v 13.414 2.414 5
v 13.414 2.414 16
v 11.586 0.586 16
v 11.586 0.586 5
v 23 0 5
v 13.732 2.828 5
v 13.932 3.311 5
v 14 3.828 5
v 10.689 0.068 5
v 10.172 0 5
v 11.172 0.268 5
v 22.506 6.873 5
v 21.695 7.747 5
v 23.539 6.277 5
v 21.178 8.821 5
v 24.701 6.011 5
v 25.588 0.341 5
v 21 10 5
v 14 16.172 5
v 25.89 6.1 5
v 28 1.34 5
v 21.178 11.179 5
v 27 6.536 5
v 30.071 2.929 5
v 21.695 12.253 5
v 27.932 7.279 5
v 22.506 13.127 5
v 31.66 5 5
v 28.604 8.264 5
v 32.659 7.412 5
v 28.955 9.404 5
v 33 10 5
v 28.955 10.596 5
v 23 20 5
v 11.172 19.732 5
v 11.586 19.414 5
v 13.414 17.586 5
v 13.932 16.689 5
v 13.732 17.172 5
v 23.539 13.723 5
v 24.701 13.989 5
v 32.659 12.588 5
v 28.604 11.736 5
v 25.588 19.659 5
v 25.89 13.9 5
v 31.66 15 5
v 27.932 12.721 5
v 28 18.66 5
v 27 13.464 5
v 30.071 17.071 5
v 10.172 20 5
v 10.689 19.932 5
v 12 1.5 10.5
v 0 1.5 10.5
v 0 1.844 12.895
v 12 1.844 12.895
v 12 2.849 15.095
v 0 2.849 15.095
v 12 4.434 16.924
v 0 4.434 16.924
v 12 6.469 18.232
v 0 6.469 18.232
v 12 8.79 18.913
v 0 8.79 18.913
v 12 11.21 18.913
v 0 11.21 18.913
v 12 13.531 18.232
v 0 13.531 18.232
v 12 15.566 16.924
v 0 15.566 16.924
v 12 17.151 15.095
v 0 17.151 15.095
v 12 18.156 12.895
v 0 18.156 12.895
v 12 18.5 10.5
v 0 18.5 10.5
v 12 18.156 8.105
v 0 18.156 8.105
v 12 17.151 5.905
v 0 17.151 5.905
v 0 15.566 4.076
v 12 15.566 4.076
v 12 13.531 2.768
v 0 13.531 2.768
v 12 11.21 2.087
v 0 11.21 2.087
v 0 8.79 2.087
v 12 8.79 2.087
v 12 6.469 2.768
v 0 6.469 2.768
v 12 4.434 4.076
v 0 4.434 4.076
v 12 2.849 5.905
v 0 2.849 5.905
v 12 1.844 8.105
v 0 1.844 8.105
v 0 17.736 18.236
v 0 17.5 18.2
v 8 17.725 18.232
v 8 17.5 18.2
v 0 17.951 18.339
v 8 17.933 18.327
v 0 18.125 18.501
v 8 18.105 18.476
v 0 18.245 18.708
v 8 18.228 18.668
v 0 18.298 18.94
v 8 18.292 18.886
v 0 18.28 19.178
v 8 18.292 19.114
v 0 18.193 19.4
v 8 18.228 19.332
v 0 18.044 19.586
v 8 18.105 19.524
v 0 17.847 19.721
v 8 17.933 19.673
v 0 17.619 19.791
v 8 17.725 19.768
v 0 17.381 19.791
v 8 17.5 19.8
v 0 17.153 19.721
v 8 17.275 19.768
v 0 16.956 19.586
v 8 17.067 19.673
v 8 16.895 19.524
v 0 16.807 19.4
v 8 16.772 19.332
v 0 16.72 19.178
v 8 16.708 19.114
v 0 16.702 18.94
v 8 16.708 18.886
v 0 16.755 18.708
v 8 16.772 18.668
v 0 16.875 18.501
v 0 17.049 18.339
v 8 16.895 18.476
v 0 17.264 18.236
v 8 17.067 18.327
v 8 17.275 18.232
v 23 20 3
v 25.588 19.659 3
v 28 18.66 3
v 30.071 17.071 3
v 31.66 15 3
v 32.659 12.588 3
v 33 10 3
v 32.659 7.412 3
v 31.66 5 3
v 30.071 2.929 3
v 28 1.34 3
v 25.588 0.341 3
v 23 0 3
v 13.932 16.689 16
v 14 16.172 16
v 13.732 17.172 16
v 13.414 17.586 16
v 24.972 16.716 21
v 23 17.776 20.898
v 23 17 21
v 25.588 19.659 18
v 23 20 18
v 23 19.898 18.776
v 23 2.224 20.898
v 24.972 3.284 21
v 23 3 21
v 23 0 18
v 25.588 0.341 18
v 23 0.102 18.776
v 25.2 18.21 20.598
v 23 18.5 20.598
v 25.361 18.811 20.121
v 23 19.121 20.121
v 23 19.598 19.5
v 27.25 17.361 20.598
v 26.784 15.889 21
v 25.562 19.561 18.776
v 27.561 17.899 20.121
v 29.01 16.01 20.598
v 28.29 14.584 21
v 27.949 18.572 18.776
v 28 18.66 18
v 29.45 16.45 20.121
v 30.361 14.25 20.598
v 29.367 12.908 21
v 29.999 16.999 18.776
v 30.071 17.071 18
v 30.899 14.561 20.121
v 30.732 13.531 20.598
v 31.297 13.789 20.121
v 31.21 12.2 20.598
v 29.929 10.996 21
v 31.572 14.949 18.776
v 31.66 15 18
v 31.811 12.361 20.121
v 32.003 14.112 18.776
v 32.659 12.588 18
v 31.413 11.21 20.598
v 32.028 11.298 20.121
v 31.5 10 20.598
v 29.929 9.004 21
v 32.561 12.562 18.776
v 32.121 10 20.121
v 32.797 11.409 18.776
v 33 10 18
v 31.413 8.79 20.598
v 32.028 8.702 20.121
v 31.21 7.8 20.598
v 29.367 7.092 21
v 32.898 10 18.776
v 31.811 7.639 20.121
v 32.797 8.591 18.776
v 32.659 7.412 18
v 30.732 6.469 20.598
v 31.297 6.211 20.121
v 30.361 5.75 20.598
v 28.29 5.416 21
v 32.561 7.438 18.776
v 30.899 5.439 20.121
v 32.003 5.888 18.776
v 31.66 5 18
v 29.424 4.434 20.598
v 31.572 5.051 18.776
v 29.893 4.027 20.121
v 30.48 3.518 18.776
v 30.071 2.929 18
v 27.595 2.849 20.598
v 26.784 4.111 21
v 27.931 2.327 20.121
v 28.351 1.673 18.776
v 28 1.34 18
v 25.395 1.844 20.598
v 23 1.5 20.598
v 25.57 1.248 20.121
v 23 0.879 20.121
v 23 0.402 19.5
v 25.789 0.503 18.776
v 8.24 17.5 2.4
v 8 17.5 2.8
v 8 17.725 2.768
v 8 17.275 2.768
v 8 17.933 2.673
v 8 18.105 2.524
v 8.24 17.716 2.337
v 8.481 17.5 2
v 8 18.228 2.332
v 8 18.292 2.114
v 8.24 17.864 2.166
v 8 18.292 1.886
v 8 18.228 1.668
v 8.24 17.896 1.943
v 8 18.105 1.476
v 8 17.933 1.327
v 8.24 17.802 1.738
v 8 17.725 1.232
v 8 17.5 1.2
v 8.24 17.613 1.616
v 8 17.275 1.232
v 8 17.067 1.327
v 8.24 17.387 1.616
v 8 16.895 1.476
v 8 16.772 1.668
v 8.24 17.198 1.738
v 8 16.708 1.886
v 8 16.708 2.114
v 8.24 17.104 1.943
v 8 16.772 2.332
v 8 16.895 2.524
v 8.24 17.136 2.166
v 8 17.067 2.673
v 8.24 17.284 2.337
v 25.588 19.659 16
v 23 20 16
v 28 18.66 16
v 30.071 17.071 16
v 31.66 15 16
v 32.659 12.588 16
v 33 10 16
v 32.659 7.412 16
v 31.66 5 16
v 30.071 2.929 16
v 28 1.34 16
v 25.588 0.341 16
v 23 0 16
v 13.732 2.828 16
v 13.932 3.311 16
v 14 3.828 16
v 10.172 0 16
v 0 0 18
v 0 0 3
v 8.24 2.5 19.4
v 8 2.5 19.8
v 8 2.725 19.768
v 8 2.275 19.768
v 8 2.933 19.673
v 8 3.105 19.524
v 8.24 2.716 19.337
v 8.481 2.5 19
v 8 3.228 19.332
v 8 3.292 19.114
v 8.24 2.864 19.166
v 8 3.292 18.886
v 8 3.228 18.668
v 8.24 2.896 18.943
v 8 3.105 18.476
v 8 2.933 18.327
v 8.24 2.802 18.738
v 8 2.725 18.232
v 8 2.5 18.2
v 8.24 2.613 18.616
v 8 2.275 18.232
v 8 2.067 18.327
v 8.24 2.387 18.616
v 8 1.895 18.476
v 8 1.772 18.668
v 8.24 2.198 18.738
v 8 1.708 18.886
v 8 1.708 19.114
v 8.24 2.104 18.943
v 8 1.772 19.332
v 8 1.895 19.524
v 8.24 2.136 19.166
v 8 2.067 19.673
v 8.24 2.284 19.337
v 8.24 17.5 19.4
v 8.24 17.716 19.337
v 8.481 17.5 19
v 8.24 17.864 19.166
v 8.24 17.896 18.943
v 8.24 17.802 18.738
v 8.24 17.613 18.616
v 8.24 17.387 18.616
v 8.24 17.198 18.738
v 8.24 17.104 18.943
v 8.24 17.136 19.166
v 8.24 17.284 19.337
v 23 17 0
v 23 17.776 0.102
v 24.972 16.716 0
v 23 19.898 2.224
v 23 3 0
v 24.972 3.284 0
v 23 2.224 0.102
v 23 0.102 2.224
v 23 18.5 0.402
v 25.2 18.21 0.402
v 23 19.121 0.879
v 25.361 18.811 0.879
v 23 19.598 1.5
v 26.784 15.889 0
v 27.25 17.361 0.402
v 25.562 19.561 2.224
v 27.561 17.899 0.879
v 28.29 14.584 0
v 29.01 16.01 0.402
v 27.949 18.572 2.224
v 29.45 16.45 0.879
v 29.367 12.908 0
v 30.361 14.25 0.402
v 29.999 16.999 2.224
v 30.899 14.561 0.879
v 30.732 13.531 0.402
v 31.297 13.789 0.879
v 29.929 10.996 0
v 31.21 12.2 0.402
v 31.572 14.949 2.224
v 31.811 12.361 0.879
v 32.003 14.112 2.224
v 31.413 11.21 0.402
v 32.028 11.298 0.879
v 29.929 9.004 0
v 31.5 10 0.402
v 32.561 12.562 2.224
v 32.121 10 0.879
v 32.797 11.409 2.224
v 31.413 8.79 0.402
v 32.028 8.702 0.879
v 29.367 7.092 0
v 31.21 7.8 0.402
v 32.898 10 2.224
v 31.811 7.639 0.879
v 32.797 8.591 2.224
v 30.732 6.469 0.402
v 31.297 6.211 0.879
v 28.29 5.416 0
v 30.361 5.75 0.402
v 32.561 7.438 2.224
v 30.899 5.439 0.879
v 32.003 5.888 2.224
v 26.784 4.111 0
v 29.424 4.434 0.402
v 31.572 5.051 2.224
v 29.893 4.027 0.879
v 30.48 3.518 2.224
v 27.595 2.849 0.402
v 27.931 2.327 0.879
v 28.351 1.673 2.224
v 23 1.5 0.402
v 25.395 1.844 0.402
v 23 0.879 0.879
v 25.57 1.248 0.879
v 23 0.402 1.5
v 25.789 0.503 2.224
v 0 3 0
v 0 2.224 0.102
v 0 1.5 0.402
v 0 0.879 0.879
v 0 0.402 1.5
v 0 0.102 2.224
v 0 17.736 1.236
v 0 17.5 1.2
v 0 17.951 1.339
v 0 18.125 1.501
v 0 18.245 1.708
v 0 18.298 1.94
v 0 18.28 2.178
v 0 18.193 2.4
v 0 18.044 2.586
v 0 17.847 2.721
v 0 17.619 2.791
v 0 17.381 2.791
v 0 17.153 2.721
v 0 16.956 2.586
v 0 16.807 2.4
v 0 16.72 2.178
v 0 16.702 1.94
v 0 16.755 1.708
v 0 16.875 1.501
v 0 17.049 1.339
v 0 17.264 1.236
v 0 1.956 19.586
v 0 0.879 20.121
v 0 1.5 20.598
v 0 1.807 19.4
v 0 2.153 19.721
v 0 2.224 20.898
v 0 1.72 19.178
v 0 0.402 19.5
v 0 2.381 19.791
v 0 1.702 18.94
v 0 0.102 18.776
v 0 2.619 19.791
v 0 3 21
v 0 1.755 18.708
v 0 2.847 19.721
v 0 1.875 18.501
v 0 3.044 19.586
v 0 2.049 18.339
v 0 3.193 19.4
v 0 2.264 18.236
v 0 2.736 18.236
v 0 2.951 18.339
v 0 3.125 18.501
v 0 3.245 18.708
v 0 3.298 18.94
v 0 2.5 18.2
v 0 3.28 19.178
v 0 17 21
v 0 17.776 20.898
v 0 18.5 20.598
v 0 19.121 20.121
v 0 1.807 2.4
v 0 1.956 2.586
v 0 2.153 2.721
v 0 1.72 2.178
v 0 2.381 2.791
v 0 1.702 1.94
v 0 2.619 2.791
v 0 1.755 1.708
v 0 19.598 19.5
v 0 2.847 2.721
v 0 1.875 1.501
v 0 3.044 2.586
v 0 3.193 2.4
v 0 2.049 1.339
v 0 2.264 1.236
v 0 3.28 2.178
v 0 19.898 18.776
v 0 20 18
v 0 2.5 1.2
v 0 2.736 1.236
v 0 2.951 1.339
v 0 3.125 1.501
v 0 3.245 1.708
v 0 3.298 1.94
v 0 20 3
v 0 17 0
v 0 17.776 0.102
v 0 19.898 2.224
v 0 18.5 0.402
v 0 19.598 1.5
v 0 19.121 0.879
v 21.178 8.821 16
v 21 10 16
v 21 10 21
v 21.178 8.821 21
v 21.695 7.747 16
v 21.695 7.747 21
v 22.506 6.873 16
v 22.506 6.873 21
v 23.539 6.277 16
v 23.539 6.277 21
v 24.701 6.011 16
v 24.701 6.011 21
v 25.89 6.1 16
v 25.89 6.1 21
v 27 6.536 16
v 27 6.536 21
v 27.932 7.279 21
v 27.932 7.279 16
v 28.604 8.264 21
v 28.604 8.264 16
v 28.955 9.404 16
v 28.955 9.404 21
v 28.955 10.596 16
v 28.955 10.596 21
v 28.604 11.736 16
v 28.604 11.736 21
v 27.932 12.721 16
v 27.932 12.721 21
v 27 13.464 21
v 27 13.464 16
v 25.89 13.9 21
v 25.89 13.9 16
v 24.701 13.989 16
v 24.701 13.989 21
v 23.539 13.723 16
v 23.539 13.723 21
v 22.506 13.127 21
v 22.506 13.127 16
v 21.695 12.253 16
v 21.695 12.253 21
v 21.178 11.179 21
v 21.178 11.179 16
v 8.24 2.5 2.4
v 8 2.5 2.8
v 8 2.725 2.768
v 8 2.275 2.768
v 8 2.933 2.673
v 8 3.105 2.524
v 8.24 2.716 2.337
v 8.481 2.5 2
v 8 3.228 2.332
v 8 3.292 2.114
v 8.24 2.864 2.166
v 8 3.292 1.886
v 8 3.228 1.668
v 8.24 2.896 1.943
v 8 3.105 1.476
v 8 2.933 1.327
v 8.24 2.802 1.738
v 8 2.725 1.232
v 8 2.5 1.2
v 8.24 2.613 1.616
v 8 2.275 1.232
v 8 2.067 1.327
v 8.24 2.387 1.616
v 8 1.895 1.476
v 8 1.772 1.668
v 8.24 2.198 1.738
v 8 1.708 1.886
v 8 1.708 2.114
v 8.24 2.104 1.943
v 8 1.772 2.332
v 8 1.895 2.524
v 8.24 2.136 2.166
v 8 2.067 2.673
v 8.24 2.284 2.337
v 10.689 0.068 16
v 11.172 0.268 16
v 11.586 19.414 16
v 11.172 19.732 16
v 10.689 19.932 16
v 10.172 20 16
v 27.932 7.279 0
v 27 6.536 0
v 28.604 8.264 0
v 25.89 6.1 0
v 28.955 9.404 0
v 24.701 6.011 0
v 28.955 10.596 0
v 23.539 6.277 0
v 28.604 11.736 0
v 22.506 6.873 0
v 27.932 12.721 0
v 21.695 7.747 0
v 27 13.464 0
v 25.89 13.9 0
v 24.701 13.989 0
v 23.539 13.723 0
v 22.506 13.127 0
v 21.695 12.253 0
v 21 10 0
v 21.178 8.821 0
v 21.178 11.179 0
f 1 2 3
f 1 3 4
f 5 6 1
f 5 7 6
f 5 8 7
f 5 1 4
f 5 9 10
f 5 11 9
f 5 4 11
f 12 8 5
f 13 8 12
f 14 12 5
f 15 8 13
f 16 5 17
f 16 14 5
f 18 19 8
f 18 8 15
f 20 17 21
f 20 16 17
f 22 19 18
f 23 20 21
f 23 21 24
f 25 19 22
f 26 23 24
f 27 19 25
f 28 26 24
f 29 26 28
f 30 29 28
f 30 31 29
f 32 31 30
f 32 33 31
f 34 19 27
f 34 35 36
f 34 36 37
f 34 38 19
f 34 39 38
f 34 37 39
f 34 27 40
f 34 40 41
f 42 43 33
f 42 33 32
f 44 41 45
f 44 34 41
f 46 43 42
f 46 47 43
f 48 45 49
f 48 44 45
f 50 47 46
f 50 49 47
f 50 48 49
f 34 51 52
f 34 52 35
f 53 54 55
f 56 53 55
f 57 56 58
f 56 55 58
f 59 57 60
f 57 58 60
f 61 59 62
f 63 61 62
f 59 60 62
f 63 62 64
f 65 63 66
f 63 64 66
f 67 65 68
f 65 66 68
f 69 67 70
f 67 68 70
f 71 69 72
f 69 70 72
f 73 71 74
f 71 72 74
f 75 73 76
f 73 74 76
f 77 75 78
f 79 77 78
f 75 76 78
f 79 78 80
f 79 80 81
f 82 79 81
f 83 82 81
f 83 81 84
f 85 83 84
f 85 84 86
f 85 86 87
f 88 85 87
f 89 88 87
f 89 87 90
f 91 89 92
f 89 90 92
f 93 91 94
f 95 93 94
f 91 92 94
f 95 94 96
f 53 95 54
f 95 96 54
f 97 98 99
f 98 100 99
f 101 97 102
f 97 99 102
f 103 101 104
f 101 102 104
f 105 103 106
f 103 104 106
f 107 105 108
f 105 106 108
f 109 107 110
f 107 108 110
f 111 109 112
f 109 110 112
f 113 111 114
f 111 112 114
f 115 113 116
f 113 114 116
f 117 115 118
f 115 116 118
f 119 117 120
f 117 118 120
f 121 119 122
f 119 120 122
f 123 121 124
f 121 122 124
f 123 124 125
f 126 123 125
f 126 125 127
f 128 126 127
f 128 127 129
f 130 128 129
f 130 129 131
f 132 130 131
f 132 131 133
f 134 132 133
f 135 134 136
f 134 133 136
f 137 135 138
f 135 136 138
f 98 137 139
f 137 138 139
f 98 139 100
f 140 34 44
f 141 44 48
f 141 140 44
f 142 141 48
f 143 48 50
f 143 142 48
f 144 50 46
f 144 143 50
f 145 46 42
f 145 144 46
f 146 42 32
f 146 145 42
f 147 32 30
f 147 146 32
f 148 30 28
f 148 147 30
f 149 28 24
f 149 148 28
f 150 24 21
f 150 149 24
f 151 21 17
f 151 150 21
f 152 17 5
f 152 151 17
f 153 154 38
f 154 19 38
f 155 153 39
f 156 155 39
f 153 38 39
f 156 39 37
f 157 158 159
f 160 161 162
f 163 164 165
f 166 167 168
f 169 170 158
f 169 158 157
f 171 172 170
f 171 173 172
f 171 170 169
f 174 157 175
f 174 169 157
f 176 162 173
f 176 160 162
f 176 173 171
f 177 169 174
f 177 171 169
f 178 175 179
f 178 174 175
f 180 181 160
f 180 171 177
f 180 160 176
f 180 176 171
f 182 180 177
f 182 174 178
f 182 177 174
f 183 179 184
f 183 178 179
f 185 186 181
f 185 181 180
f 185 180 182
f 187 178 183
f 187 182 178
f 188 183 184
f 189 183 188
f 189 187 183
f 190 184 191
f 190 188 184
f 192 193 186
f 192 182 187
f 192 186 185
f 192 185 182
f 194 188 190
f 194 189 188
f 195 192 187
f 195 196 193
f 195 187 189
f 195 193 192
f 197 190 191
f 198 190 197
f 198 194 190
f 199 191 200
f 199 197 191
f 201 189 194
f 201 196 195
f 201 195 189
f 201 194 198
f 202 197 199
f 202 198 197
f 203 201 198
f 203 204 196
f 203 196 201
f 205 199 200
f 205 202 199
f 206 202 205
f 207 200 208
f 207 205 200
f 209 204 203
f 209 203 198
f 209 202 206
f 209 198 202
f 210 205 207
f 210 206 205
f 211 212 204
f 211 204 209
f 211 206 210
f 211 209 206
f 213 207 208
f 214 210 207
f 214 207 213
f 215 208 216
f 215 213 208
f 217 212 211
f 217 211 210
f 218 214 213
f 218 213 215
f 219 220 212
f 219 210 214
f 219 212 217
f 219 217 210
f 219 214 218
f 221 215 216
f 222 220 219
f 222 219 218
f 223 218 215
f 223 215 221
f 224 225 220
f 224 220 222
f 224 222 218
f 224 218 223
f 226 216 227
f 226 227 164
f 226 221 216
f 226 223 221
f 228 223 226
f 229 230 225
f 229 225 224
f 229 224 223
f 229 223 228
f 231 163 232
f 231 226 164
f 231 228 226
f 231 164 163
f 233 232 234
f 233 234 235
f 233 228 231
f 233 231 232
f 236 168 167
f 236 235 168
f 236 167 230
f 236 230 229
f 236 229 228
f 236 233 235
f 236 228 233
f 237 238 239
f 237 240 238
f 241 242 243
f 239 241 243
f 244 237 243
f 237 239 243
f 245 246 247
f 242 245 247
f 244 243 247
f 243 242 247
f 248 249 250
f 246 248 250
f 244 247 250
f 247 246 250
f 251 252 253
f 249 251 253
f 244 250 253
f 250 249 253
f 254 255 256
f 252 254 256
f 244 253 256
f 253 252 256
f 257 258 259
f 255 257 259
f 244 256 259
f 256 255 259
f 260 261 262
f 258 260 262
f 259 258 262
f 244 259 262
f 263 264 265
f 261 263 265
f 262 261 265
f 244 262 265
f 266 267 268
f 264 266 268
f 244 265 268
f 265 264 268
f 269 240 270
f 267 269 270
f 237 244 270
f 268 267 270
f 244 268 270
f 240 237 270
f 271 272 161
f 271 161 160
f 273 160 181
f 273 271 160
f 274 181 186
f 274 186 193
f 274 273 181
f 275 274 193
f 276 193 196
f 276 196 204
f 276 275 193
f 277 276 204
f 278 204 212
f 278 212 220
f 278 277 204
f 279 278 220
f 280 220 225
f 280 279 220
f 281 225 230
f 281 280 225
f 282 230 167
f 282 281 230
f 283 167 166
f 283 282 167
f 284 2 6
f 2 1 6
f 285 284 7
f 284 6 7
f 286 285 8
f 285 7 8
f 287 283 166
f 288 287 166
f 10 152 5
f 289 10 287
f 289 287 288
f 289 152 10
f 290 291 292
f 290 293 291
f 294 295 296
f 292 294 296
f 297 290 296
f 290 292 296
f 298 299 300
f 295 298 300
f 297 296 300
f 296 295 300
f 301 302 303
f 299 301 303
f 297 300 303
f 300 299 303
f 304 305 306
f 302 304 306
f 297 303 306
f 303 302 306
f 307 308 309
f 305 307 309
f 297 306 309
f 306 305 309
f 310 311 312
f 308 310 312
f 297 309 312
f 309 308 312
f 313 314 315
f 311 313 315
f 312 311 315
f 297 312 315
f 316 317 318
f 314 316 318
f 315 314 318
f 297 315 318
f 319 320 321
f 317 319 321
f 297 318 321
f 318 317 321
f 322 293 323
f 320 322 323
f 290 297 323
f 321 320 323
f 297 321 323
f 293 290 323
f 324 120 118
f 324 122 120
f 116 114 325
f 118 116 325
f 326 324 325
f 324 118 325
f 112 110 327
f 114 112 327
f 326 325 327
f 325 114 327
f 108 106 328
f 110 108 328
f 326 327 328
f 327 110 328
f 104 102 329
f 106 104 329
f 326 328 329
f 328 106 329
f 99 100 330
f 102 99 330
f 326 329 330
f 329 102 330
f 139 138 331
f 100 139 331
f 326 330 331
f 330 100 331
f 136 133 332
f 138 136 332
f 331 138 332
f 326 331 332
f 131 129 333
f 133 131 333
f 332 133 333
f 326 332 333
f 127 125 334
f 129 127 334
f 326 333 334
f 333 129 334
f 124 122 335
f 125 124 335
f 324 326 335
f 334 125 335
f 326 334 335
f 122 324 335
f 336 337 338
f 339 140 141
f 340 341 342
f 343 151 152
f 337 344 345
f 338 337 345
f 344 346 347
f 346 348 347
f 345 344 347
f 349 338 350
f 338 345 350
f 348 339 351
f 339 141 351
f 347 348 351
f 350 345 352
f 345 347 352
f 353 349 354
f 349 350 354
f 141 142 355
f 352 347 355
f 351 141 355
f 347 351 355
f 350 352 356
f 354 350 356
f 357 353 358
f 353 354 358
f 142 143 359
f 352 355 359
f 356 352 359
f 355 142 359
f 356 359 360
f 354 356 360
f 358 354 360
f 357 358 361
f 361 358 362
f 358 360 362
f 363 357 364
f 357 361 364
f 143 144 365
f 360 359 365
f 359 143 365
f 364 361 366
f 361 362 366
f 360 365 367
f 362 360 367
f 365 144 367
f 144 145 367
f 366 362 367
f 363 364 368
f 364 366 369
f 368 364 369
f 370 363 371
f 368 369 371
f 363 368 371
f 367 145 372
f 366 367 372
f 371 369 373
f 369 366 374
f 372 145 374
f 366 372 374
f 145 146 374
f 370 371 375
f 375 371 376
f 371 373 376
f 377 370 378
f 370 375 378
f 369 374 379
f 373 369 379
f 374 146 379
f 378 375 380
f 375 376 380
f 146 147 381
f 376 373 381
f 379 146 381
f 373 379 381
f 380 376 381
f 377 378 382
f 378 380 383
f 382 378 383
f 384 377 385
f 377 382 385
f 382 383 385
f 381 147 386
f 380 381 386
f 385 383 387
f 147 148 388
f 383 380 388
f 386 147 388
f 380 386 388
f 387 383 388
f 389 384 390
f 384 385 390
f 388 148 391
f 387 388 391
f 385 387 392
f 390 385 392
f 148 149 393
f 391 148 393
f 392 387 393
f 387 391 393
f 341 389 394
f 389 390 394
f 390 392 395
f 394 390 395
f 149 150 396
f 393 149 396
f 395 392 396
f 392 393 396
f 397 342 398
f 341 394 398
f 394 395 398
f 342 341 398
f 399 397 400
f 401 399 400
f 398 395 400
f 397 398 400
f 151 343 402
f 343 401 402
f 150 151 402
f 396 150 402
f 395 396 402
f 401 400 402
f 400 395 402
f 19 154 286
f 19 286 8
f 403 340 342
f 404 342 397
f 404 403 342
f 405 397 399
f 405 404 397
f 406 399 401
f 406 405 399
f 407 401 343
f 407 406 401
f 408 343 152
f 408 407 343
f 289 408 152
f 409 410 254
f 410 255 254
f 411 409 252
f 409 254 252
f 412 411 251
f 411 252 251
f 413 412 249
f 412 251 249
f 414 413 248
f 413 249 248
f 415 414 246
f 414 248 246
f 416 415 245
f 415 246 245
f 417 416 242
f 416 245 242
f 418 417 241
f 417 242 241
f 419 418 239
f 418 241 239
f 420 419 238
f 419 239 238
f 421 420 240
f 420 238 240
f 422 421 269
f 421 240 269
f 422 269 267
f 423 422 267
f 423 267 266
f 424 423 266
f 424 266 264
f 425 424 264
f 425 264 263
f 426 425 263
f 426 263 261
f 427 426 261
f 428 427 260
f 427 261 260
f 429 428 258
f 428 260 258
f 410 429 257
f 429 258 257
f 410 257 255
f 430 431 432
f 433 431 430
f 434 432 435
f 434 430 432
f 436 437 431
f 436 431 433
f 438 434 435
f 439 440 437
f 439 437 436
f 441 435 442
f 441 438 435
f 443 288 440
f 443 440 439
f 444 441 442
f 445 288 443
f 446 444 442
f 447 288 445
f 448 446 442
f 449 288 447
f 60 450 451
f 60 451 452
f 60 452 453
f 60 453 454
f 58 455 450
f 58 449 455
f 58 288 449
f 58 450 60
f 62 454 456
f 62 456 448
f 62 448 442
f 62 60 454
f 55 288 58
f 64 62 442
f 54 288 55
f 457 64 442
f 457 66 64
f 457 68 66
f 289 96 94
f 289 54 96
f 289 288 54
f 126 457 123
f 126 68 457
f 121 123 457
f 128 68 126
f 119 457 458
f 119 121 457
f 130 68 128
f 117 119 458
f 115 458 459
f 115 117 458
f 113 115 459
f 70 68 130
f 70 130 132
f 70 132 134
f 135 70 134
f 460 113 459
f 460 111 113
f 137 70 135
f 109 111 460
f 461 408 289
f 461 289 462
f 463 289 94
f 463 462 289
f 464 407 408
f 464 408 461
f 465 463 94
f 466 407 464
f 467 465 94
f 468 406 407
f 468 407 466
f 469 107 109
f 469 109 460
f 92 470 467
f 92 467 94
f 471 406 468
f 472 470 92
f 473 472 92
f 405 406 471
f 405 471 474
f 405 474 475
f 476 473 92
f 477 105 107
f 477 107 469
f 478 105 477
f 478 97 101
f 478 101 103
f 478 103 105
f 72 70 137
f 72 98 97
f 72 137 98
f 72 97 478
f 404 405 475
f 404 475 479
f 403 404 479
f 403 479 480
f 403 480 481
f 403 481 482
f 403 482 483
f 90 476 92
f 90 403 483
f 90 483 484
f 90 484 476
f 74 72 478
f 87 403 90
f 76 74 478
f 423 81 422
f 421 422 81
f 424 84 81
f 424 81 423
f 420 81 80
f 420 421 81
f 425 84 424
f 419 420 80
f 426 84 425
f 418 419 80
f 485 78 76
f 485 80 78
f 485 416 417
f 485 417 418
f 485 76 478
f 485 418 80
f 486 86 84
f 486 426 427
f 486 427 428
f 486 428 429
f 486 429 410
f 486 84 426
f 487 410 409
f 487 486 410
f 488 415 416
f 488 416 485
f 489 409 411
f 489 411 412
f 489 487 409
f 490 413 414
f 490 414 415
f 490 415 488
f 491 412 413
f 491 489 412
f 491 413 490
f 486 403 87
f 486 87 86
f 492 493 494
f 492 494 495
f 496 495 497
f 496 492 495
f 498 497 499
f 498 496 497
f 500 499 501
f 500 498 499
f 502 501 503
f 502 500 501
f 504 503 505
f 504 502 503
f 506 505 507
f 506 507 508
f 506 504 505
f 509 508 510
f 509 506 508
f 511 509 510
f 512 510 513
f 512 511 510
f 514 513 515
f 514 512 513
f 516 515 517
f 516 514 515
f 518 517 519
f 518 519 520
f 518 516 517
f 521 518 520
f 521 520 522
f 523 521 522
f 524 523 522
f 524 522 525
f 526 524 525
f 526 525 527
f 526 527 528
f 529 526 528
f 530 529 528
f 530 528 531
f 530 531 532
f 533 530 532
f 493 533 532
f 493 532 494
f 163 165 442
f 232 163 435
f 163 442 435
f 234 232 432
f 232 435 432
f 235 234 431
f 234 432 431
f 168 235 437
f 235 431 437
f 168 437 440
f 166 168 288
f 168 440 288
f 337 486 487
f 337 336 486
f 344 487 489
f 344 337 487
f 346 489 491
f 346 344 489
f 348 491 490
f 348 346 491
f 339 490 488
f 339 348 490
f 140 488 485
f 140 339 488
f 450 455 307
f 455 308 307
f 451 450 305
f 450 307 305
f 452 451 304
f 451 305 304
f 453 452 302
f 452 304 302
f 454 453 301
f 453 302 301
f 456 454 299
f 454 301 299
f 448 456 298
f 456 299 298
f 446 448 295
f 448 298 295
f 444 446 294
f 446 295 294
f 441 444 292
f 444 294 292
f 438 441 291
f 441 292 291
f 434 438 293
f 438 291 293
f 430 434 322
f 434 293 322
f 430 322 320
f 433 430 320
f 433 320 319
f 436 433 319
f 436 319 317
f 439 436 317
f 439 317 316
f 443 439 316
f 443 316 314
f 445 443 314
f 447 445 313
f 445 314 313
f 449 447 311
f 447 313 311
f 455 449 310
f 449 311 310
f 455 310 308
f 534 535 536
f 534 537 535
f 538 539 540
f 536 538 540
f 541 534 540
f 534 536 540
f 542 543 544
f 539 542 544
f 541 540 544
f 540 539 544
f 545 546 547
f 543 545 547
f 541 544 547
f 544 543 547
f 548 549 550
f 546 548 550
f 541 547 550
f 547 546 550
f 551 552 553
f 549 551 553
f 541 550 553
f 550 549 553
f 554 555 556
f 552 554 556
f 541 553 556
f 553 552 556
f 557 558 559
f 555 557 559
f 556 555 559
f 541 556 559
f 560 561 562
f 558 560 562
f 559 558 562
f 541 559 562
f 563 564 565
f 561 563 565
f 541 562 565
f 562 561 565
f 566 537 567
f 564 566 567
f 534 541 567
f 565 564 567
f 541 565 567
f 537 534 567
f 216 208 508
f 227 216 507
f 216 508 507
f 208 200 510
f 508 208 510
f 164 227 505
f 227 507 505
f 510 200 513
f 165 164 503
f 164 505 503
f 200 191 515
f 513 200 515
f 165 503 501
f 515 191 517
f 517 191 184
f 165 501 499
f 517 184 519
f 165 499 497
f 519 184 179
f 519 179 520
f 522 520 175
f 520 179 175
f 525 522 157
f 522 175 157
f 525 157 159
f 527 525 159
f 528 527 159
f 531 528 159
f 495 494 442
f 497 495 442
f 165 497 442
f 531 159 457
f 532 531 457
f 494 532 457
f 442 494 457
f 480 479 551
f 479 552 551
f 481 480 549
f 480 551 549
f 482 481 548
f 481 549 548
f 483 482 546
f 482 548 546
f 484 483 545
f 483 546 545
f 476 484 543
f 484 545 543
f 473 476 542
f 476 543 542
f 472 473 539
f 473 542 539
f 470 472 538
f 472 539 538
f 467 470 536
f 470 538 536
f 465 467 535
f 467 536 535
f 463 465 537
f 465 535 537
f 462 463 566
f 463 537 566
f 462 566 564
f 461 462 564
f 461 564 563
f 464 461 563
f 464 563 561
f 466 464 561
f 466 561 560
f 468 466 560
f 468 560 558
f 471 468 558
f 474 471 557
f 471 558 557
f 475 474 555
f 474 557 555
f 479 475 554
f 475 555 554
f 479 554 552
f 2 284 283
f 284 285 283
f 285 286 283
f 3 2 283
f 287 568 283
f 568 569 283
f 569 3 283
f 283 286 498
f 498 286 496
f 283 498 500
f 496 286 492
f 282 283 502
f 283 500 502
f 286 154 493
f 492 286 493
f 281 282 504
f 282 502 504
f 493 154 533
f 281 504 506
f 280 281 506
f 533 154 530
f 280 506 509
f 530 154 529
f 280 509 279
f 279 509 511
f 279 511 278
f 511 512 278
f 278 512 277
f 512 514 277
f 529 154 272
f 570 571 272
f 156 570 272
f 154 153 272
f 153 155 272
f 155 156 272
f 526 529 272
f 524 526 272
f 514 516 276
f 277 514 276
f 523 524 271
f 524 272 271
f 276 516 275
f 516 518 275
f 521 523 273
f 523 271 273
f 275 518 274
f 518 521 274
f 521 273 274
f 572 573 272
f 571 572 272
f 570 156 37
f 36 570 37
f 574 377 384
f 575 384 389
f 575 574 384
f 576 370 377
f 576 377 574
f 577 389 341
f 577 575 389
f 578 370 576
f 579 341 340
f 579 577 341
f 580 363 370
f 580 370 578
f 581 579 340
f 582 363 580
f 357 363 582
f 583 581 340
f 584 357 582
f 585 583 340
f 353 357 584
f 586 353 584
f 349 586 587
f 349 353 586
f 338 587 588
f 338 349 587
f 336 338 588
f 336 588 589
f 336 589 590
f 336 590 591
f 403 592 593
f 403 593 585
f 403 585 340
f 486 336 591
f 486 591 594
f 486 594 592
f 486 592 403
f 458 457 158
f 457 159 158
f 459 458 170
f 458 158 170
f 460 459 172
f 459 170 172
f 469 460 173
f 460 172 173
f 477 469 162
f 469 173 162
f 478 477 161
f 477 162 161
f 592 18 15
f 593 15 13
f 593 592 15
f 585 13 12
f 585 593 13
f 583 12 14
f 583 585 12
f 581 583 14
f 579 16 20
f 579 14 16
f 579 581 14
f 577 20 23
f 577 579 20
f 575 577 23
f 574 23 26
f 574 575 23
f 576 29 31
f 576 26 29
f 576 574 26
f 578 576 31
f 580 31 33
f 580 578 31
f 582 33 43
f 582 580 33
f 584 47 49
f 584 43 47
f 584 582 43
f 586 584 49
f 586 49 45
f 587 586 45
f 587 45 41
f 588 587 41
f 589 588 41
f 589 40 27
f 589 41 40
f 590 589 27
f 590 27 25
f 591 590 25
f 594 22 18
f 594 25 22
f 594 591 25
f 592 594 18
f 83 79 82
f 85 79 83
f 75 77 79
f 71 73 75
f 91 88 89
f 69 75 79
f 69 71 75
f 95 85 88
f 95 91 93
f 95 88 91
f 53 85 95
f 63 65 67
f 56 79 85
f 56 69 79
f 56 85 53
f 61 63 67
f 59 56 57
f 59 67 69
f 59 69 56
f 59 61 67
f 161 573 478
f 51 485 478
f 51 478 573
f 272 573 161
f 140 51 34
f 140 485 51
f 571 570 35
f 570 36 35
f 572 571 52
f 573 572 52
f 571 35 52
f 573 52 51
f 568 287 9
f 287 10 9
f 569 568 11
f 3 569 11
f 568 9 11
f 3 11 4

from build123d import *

# Parameters (mm, degrees)
SKETCH1_R                 = 4
BOSS_EXTRUDE1_DEPTH       = 21
SKETCH2_W                 = 19
SKETCH2_H                 = 11
CUT_EXTRUDE1_DEPTH        = 20
SKETCH3_R                 = 8.5
CUT_EXTRUDE2_DEPTH        = 12
M2X0_4_TAPPED_HOLE1_D     = 1.6
M2X0_4_TAPPED_HOLE1_DEPTH = 8
M2X0_4_TAPPED_HOLE1_TIP   = 0.480688495
FILLET2_R                 = 3
CHAMFER1_SIZE             = 3
FILLET3_R                 = 2


with BuildPart() as part:
    # Sketch1 → Boss-Extrude1 (new body)
    with BuildSketch(Plane.XY):
        with BuildLine():
            Line((0, 0), (0, 20))
            Line((0, 20), (23, 20))
            ThreePointArc((23, 20), (33, 10), (23, 0))
            Line((23, 0), (0, 0))
        make_face()
        with Locations(Location((25, 10, 0), (0, 0, 180))):
            Circle(SKETCH1_R, mode=Mode.SUBTRACT)
    extrude(amount=BOSS_EXTRUDE1_DEPTH)

    # Sketch2 → Cut-Extrude1 (cut)
    with BuildSketch(Plane(origin=(0, 20, 0), x_dir=(1, 0, 0), z_dir=(0, 1, 0))):
        with Locations((23.5, -10.5)):
            Rectangle(SKETCH2_W, SKETCH2_H)
    extrude(amount=-CUT_EXTRUDE1_DEPTH, mode=Mode.SUBTRACT)

    # Sketch3 → Cut-Extrude2 (cut)
    with BuildSketch(Plane.ZY):
        with Locations(Location((10.5, 10, 0), (0, 0, 270))):
            Circle(SKETCH3_R)
    extrude(amount=-CUT_EXTRUDE2_DEPTH, mode=Mode.SUBTRACT)

    # M2x0.4 Tapped Hole1
    with Locations(Plane.ZY):
        with Locations((2, 17.5), (19, 17.5), (19, 2.5), (2, 2.5)):
            Hole(M2X0_4_TAPPED_HOLE1_D / 2, depth=M2X0_4_TAPPED_HOLE1_DEPTH)
            with Locations((0, 0, -(M2X0_4_TAPPED_HOLE1_DEPTH + M2X0_4_TAPPED_HOLE1_TIP / 2))):  # 118° drill point
                Cone(0, M2X0_4_TAPPED_HOLE1_D / 2, M2X0_4_TAPPED_HOLE1_TIP, mode=Mode.SUBTRACT)

    # Fillet2
    fillet2_edges = [part.edges().sort_by_distance(p)[0] for p in [
        (11.5, 20, 21),
        (11.5, 0, 21),
        (11.5, 20, 0),
        (33, 10, 0),
        (11.5, 0, 0),
        (33, 10, 21),
    ]]
    fillet(fillet2_edges, radius=FILLET2_R)

    # Chamfer1
    chamfer1_edges = [part.edges().sort_by_distance(p)[0] for p in [
        (14, 0, 10.5),
        (14, 20, 10.5),
    ]]
    chamfer(chamfer1_edges, length=CHAMFER1_SIZE)

    # Fillet3
    fillet3_edges = [part.edges().sort_by_distance(p)[0] for p in [
        (14, 17, 10.5),
        (14, 3, 10.5),
        (11, 0, 10.5),
        (11, 20, 10.5),
    ]]
    fillet(fillet3_edges, radius=FILLET3_R)


solid = part.part
